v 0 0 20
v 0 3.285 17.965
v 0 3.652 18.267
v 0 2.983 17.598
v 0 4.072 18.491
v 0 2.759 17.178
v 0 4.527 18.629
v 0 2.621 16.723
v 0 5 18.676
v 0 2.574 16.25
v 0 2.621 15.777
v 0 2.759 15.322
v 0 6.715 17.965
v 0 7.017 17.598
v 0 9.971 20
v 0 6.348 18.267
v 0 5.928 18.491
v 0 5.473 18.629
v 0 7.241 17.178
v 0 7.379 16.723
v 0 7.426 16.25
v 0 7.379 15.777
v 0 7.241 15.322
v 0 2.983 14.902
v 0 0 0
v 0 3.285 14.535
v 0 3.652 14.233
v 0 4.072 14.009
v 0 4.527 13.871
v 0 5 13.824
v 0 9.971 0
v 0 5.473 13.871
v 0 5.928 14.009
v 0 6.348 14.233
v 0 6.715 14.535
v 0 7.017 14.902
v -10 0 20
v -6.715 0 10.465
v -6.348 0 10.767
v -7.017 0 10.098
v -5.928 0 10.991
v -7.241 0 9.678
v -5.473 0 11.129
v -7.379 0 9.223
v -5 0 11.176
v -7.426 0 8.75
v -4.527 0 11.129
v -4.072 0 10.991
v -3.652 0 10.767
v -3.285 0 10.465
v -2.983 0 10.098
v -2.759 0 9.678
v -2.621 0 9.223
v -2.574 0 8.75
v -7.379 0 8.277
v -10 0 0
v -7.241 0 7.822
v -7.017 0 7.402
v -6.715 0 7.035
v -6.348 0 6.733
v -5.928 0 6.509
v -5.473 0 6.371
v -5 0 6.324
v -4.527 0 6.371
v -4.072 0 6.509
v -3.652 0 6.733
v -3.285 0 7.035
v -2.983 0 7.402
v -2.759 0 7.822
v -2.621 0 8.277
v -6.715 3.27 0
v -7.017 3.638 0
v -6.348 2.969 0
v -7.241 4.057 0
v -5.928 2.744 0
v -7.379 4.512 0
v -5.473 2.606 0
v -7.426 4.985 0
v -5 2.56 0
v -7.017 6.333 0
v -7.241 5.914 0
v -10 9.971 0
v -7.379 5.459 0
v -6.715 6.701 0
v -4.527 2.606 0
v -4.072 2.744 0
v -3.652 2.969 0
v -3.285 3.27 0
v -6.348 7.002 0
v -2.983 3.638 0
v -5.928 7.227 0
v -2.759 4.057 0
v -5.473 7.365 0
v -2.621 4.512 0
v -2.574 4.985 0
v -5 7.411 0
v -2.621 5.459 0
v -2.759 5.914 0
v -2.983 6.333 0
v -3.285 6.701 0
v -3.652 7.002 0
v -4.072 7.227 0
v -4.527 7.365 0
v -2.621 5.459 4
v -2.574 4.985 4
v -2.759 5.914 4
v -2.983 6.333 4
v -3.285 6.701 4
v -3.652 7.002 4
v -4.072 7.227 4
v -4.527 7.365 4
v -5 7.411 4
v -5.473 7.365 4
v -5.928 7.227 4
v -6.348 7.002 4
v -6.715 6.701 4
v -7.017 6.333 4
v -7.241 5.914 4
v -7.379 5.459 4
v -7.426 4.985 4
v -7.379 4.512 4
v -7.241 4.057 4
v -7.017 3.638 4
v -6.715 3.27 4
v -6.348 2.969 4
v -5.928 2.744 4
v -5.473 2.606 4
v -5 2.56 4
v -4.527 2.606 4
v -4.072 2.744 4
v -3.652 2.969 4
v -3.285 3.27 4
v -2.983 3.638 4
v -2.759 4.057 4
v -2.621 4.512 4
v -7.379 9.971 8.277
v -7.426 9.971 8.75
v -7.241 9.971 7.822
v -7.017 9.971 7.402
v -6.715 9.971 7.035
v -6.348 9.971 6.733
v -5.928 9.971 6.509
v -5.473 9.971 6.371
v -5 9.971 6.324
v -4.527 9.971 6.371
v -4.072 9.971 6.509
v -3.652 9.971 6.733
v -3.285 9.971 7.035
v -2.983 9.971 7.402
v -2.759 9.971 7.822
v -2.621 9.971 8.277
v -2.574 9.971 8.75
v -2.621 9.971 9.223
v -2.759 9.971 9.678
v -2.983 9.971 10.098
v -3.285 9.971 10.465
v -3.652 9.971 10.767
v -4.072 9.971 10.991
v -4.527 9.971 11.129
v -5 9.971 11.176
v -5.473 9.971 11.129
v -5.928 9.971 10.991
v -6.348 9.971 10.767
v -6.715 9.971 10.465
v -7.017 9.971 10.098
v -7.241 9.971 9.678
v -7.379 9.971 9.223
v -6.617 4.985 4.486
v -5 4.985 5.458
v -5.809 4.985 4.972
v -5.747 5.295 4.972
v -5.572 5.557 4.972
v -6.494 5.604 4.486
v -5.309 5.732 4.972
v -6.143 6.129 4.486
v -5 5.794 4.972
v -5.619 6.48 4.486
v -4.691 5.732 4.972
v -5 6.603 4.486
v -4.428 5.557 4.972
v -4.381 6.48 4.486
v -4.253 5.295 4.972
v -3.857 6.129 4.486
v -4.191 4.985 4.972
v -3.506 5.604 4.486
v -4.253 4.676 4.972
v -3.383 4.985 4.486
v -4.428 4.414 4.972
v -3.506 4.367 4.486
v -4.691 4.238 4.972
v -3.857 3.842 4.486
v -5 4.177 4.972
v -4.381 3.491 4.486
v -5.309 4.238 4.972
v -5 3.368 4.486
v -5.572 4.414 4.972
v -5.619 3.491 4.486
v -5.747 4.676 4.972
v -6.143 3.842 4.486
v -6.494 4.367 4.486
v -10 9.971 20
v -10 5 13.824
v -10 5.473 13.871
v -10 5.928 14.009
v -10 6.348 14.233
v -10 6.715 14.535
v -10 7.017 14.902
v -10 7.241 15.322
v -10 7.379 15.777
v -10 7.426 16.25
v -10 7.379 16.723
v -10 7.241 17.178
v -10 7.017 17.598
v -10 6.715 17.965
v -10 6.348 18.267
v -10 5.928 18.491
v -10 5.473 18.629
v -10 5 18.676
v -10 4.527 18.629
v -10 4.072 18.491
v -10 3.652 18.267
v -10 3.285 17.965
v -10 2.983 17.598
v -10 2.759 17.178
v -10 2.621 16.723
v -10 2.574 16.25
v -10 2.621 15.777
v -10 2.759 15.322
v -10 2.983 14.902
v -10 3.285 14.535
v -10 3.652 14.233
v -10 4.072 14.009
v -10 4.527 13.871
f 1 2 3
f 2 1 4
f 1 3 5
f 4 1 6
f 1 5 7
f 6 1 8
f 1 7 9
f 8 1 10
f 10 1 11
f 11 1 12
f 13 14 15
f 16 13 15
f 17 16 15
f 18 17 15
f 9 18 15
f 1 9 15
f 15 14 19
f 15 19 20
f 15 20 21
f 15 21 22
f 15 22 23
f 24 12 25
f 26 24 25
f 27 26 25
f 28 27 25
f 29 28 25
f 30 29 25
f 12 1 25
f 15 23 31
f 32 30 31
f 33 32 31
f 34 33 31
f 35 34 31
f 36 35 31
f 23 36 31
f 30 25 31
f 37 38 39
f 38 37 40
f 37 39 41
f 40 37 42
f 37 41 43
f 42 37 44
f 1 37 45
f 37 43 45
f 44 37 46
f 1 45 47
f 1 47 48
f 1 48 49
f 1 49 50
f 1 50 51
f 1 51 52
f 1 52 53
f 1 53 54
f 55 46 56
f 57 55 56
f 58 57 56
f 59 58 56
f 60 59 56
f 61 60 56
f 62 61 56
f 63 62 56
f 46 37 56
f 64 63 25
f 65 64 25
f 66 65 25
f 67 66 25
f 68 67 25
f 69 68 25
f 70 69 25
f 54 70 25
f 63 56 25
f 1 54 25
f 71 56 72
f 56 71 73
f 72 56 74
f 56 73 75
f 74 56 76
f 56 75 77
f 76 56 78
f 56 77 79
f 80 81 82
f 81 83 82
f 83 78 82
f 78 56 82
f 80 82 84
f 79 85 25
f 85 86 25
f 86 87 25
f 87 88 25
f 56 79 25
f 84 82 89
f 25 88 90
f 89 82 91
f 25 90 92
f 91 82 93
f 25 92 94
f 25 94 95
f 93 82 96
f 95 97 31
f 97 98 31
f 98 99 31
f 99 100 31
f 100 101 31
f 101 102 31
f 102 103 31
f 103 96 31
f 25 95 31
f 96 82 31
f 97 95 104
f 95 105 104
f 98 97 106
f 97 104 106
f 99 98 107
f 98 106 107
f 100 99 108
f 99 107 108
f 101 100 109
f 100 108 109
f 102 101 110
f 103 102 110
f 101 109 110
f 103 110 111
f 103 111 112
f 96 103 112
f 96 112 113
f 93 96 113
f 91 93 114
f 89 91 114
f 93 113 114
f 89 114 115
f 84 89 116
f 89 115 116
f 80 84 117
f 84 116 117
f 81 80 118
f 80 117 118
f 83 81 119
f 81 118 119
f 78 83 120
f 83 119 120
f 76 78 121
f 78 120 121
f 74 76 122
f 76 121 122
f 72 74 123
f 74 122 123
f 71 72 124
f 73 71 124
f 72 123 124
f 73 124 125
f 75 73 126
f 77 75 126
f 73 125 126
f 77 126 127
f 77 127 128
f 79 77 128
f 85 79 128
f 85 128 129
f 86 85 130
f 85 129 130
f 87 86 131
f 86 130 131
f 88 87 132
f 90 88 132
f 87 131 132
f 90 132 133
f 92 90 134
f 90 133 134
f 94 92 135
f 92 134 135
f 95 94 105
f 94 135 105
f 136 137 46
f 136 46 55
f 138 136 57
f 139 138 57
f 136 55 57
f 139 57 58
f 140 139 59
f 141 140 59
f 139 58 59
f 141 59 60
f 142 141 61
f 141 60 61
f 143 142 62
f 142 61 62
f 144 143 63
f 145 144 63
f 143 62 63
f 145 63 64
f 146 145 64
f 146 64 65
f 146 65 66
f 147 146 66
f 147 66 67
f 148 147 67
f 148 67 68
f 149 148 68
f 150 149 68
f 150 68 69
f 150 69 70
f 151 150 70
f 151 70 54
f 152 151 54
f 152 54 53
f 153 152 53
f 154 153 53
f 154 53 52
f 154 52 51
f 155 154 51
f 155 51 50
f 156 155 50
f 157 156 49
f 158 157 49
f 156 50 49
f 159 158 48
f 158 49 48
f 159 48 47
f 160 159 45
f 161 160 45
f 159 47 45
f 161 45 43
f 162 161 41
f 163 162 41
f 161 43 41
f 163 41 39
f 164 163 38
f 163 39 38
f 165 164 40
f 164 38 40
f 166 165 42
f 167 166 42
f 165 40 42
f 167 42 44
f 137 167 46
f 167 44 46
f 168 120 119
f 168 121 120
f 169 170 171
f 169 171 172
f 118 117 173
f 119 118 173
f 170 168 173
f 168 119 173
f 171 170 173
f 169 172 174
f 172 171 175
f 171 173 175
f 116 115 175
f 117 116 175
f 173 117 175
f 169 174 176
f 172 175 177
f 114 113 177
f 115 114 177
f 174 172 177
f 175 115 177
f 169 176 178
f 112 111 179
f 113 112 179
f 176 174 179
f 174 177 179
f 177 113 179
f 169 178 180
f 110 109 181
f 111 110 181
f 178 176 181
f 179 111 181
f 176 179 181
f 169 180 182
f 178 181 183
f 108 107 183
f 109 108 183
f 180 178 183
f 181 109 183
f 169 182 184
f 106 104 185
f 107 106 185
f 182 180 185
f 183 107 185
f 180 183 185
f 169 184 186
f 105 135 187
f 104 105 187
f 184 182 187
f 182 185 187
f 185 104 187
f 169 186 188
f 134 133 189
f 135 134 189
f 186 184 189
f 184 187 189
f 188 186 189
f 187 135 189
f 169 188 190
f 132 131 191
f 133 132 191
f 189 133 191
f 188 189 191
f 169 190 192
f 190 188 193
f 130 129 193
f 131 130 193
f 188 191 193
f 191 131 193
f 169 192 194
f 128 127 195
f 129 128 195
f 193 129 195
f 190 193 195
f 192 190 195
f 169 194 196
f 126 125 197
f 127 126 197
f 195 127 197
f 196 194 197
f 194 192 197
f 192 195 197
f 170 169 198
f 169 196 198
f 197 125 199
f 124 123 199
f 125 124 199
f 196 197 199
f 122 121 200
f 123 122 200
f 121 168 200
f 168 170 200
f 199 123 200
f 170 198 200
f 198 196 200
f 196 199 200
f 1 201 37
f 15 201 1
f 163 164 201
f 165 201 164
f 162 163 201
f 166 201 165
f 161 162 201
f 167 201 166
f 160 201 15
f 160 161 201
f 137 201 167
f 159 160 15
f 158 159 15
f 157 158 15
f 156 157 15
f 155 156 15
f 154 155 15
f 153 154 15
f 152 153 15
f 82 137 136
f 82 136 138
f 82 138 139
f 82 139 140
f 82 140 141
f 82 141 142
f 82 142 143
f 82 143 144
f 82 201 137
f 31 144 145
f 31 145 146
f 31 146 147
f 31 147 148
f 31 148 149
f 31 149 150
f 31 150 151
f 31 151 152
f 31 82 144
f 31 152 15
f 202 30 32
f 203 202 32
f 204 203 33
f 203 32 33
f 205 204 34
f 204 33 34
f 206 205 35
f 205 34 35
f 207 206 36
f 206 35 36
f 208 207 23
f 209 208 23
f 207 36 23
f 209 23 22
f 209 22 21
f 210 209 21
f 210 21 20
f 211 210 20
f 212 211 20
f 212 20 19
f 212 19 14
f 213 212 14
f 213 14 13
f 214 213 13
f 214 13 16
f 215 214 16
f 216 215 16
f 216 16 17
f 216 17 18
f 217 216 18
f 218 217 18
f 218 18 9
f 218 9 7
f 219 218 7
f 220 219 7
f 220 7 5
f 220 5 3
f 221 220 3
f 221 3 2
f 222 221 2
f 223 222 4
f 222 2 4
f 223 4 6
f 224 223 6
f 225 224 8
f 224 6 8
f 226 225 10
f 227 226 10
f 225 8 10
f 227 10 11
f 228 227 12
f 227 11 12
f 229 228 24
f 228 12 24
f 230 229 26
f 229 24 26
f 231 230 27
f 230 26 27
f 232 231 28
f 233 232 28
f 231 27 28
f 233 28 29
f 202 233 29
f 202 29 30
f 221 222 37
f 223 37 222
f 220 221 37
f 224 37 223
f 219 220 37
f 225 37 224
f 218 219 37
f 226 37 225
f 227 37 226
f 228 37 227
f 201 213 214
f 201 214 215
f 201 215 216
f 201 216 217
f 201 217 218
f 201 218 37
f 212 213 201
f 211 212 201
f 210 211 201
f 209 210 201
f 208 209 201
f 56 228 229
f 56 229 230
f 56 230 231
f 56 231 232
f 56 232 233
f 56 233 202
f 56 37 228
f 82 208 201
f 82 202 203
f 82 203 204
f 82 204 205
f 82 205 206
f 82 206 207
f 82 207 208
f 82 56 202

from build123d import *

# Parameters (mm, degrees)
SKETCH1_W                       = 10
SKETCH1_H                       = 9.970930233
BOSS_EXTRUDE1_DEPTH             = 20
F_11_0_191_DIAMETER_HOLE6_D     = 4.8514
F_11_0_191_DIAMETER_HOLE6_DEPTH = 4
F_11_0_191_DIAMETER_HOLE6_TIP   = 1.457507604
F_11_0_191_DIAMETER_HOLE7_D     = 4.8514
F_11_0_191_DIAMETER_HOLE8_D     = 4.8514


with BuildPart() as part:
    # Sketch1 → Boss-Extrude1 (new body)
    with BuildSketch(Plane.XY):
        with Locations((-5, 4.985465117)):
            Rectangle(SKETCH1_W, SKETCH1_H)
    extrude(amount=BOSS_EXTRUDE1_DEPTH)

    # #11 (0.191) Diameter Hole6
    with Locations(Plane(origin=(0, 0, 0), x_dir=(-1, 0, 0), z_dir=(0, 0, -1))):
        with Locations((5, 4.985465116)):
            Hole(F_11_0_191_DIAMETER_HOLE6_D / 2, depth=F_11_0_191_DIAMETER_HOLE6_DEPTH)
            with Locations((0, 0, -(F_11_0_191_DIAMETER_HOLE6_DEPTH + F_11_0_191_DIAMETER_HOLE6_TIP / 2))):  # 118° drill point
                Cone(0, F_11_0_191_DIAMETER_HOLE6_D / 2, F_11_0_191_DIAMETER_HOLE6_TIP, mode=Mode.SUBTRACT)

    # #11 (0.191) Diameter Hole7 (through all)
    with Locations(Plane(origin=(0, 9.970930233, 0), x_dir=(1, 0, 0), z_dir=(0, 1, 0))):
        with Locations((-5, -8.75)):
            Hole(F_11_0_191_DIAMETER_HOLE7_D / 2)

    # #11 (0.191) Diameter Hole8 (through all)
    with Locations(Plane.ZY.offset(10)):
        with Locations((16.25, 5)):
            Hole(F_11_0_191_DIAMETER_HOLE8_D / 2)


solid = part.part
